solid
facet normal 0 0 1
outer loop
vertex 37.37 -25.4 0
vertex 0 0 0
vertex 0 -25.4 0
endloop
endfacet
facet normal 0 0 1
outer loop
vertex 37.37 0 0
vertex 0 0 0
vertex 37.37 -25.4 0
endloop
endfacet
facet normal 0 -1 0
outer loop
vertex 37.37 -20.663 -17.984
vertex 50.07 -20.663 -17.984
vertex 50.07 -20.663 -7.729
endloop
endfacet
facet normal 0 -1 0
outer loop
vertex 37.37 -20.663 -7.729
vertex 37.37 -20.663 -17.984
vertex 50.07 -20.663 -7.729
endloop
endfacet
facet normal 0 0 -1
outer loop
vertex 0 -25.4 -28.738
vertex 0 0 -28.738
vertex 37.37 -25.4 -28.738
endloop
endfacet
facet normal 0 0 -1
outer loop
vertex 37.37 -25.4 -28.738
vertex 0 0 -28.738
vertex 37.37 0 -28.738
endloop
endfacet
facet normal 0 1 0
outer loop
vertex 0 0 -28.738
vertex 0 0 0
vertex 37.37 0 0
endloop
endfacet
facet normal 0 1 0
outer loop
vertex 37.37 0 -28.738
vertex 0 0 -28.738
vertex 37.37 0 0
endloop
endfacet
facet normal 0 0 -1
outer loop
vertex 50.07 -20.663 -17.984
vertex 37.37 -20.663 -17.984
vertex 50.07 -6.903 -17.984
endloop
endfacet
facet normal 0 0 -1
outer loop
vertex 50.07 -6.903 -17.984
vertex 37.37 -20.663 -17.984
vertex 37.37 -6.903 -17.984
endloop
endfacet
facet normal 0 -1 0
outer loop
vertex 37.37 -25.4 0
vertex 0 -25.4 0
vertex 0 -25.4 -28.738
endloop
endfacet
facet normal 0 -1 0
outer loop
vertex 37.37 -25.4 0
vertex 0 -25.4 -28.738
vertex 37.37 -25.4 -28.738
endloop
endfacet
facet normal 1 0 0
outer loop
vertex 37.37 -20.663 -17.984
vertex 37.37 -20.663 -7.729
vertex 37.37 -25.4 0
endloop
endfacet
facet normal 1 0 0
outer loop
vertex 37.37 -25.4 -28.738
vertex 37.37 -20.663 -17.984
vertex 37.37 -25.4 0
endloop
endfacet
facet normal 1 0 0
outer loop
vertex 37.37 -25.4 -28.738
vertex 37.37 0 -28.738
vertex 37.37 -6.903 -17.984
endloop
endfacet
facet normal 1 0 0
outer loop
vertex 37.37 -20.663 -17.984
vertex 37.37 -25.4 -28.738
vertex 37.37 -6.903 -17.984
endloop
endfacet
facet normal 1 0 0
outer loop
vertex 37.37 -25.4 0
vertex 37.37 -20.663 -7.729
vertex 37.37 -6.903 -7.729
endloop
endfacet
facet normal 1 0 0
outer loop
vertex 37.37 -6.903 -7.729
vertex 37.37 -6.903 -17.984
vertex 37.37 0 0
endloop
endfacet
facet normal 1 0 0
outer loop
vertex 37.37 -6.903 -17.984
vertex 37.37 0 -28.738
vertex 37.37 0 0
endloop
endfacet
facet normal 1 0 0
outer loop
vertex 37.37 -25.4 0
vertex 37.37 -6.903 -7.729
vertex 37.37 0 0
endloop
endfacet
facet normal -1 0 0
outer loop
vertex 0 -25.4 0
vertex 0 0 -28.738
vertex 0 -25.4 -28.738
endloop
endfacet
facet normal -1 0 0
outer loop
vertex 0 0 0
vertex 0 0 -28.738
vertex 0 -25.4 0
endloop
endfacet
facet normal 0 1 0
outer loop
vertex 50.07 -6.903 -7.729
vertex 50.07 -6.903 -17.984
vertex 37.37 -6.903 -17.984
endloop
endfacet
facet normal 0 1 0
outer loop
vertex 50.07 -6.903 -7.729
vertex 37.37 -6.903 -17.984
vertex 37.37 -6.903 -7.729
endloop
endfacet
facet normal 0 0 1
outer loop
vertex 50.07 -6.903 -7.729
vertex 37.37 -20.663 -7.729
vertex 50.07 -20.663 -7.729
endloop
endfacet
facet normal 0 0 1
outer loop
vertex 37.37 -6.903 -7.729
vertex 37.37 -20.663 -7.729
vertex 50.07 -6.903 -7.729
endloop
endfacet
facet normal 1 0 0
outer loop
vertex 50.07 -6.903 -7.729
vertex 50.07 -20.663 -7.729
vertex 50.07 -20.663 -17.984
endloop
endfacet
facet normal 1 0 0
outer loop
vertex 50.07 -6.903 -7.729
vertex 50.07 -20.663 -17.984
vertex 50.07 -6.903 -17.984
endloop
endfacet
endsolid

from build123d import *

# Parameters (mm, degrees)
F0_W     = 37.3699069023
F0_H     = 28.7381336093
F1_DEPTH = 25.4
F4_W     = 13.7605443597
F4_H     = 10.2546699345
F5_DEPTH = 12.7


# Not quite as in the source:
# - the program builds the solid bodies; features that only make, move or delete a surface that nothing else refers to are left out


with BuildPart() as f1:
    # F0 (on Front) → F1 (new body)
    with BuildSketch(Plane.XZ):
        with Locations((18.6849534512, -14.3690668046)):
            Rectangle(F0_W, F0_H)
    extrude(amount=F1_DEPTH)

    # F4 (on face) → F5 (join)
    with BuildSketch(Plane.YZ.offset(37.3699069023)):
        with Locations((-13.7830860913, -12.8563437611)):
            Rectangle(F4_W, F4_H)
    extrude(amount=F5_DEPTH)


solid = f1.part
